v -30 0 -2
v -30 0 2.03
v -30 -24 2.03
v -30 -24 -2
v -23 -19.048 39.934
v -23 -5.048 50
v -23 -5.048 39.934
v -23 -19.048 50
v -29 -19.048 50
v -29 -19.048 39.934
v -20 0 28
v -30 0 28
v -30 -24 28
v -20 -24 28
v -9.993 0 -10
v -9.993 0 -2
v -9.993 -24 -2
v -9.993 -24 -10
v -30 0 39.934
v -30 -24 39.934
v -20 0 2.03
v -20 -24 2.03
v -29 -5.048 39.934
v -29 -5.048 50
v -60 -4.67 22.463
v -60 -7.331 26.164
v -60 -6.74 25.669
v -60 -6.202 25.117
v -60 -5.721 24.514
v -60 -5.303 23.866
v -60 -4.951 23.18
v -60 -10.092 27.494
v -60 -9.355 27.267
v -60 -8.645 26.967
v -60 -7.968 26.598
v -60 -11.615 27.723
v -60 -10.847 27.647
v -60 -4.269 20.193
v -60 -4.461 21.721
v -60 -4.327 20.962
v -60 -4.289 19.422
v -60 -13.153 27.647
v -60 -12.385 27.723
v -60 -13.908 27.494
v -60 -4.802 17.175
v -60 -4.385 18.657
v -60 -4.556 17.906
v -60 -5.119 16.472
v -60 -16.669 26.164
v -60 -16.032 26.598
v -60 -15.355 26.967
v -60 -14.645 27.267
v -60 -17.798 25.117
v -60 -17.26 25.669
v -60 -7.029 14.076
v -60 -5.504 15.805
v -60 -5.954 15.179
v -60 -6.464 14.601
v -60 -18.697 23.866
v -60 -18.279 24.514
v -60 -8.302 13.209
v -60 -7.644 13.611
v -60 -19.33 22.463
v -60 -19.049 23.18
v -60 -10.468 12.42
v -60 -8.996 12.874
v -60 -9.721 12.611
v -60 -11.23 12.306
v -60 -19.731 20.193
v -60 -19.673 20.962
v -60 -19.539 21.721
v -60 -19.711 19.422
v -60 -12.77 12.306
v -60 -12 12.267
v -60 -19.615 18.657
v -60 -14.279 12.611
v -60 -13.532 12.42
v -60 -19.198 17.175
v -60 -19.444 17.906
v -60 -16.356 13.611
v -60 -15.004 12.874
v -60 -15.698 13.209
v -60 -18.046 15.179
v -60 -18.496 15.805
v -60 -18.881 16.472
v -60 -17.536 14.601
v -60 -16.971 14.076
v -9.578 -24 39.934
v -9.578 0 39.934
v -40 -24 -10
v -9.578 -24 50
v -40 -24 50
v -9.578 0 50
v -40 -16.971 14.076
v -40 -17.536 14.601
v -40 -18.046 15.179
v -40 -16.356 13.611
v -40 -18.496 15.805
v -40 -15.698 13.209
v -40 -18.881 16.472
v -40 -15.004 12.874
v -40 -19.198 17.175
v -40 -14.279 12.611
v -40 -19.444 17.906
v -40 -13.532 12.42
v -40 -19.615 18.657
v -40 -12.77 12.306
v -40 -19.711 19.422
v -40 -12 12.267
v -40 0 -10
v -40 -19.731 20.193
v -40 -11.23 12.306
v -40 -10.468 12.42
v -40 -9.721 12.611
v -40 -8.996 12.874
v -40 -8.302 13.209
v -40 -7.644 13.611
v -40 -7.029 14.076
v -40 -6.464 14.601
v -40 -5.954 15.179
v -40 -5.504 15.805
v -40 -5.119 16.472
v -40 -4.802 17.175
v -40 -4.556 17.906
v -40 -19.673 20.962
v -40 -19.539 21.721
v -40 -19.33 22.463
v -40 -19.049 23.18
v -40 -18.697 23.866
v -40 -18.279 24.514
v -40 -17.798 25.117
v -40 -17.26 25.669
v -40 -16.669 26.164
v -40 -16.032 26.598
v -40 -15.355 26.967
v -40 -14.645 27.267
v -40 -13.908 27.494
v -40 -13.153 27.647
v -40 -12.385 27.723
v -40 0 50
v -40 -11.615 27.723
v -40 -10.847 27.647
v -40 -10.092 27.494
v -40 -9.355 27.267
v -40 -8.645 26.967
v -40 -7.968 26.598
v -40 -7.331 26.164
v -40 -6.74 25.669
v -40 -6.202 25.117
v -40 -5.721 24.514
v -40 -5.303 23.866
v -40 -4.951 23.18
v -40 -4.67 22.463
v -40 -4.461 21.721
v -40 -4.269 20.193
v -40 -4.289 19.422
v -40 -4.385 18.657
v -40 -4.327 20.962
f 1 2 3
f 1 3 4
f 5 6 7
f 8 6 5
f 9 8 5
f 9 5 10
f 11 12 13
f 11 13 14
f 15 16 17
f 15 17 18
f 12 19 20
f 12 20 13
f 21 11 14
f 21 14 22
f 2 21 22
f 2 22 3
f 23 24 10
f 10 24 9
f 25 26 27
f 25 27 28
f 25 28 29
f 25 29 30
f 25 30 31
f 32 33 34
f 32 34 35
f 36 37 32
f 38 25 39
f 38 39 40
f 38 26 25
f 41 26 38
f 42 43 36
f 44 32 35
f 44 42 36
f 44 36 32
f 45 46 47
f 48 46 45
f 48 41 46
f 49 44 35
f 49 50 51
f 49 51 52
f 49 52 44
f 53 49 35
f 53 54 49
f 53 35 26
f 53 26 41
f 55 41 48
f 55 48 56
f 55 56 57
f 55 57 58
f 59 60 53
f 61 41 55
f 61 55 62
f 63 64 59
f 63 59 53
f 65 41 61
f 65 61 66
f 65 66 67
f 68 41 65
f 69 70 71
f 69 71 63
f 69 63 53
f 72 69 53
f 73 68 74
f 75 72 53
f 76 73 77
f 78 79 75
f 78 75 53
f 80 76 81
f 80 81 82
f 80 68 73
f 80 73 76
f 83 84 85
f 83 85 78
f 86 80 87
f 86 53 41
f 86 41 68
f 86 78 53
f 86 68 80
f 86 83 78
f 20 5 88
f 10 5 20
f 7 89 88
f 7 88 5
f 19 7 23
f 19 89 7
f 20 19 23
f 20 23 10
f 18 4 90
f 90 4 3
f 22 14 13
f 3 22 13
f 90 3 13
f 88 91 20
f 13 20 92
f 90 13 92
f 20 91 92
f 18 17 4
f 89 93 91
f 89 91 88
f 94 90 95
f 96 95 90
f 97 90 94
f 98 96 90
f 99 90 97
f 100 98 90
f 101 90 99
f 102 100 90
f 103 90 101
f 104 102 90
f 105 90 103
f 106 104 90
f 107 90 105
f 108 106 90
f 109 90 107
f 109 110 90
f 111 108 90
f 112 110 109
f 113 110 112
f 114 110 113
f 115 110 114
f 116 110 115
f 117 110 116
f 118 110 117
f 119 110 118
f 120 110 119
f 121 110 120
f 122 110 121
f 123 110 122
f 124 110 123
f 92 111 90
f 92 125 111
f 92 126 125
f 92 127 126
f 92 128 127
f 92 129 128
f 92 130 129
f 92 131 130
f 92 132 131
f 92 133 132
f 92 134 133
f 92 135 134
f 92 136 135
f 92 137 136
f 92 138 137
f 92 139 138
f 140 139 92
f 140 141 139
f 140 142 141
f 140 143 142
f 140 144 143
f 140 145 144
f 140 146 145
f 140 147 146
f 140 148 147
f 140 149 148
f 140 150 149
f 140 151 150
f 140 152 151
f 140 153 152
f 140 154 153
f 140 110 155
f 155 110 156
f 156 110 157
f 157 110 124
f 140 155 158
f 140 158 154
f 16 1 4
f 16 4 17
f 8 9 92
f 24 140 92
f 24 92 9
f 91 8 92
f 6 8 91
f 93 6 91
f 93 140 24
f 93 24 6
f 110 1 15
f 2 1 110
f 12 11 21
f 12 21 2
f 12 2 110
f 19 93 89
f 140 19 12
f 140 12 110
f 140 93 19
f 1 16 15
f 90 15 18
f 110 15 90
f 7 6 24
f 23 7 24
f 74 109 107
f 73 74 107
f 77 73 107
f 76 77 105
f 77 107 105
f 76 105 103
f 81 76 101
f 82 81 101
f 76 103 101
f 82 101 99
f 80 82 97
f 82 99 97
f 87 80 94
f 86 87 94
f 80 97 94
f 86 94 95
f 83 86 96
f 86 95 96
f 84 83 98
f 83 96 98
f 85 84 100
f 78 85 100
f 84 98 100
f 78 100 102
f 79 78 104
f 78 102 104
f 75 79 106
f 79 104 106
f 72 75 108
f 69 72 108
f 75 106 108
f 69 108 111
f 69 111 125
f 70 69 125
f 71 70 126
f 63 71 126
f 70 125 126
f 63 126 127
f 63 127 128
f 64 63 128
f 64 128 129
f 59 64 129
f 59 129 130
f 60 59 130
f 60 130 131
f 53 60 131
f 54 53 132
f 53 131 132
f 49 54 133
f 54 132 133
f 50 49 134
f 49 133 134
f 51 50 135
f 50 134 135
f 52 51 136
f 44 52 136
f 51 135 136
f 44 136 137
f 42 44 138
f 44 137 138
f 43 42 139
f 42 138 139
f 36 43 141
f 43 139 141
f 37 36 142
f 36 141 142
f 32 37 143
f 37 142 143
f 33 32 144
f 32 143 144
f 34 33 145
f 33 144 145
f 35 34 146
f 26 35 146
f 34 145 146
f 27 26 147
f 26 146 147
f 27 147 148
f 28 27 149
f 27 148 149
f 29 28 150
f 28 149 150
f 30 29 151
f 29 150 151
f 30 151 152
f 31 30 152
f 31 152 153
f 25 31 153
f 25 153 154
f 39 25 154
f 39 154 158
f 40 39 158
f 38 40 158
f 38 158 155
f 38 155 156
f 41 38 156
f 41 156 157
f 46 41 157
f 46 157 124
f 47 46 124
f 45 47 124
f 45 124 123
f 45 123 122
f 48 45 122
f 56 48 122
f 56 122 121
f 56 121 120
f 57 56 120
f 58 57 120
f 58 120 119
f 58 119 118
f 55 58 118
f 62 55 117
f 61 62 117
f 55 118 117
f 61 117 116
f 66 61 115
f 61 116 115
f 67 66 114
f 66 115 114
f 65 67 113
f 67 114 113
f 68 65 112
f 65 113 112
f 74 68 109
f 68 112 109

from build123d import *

# Parameters (mm, degrees)
PAD_DEPTH    = 24
SKETCH002_R  = 7.732913
PAD001_DEPTH = 20
SKETCH001_W  = 6
SKETCH001_H  = 14
POCKET_DEPTH = 11


with BuildPart() as part:
    # Sketch → Pad (new body)
    with BuildSketch(Plane.XZ):
        Polygon((-9.577921, 39.93367), (-30, 39.93367), (-30, 28.000008), (-20, 28.000008), (-20, 2.029604), (-30, 2.029604), (-30, -2), (-9.99258, -2), (-9.99258, -10), (-40, -10), (-40, 50.000008), (-9.577921, 50.000008), align=None)
    extrude(amount=PAD_DEPTH)

    # Sketch002 → Pad001 (join)
    with BuildSketch(Plane(origin=(-40, 0, 0), x_dir=(0, 0, -1), z_dir=(-1, 0, 0))):
        with Locations((-20, 12)):
            Circle(SKETCH002_R)
    extrude(amount=PAD001_DEPTH)

    # Sketch001 (on Face11 of Pad) → Pocket (cut)
    with BuildSketch(Plane(origin=(0, 0, 50.000008), x_dir=(-1, 0, 0), z_dir=(0, 0, 1))):
        with Locations((26, 12.048018)):
            Rectangle(SKETCH001_W, SKETCH001_H)
    extrude(amount=-POCKET_DEPTH, mode=Mode.SUBTRACT)


solid = part.part
